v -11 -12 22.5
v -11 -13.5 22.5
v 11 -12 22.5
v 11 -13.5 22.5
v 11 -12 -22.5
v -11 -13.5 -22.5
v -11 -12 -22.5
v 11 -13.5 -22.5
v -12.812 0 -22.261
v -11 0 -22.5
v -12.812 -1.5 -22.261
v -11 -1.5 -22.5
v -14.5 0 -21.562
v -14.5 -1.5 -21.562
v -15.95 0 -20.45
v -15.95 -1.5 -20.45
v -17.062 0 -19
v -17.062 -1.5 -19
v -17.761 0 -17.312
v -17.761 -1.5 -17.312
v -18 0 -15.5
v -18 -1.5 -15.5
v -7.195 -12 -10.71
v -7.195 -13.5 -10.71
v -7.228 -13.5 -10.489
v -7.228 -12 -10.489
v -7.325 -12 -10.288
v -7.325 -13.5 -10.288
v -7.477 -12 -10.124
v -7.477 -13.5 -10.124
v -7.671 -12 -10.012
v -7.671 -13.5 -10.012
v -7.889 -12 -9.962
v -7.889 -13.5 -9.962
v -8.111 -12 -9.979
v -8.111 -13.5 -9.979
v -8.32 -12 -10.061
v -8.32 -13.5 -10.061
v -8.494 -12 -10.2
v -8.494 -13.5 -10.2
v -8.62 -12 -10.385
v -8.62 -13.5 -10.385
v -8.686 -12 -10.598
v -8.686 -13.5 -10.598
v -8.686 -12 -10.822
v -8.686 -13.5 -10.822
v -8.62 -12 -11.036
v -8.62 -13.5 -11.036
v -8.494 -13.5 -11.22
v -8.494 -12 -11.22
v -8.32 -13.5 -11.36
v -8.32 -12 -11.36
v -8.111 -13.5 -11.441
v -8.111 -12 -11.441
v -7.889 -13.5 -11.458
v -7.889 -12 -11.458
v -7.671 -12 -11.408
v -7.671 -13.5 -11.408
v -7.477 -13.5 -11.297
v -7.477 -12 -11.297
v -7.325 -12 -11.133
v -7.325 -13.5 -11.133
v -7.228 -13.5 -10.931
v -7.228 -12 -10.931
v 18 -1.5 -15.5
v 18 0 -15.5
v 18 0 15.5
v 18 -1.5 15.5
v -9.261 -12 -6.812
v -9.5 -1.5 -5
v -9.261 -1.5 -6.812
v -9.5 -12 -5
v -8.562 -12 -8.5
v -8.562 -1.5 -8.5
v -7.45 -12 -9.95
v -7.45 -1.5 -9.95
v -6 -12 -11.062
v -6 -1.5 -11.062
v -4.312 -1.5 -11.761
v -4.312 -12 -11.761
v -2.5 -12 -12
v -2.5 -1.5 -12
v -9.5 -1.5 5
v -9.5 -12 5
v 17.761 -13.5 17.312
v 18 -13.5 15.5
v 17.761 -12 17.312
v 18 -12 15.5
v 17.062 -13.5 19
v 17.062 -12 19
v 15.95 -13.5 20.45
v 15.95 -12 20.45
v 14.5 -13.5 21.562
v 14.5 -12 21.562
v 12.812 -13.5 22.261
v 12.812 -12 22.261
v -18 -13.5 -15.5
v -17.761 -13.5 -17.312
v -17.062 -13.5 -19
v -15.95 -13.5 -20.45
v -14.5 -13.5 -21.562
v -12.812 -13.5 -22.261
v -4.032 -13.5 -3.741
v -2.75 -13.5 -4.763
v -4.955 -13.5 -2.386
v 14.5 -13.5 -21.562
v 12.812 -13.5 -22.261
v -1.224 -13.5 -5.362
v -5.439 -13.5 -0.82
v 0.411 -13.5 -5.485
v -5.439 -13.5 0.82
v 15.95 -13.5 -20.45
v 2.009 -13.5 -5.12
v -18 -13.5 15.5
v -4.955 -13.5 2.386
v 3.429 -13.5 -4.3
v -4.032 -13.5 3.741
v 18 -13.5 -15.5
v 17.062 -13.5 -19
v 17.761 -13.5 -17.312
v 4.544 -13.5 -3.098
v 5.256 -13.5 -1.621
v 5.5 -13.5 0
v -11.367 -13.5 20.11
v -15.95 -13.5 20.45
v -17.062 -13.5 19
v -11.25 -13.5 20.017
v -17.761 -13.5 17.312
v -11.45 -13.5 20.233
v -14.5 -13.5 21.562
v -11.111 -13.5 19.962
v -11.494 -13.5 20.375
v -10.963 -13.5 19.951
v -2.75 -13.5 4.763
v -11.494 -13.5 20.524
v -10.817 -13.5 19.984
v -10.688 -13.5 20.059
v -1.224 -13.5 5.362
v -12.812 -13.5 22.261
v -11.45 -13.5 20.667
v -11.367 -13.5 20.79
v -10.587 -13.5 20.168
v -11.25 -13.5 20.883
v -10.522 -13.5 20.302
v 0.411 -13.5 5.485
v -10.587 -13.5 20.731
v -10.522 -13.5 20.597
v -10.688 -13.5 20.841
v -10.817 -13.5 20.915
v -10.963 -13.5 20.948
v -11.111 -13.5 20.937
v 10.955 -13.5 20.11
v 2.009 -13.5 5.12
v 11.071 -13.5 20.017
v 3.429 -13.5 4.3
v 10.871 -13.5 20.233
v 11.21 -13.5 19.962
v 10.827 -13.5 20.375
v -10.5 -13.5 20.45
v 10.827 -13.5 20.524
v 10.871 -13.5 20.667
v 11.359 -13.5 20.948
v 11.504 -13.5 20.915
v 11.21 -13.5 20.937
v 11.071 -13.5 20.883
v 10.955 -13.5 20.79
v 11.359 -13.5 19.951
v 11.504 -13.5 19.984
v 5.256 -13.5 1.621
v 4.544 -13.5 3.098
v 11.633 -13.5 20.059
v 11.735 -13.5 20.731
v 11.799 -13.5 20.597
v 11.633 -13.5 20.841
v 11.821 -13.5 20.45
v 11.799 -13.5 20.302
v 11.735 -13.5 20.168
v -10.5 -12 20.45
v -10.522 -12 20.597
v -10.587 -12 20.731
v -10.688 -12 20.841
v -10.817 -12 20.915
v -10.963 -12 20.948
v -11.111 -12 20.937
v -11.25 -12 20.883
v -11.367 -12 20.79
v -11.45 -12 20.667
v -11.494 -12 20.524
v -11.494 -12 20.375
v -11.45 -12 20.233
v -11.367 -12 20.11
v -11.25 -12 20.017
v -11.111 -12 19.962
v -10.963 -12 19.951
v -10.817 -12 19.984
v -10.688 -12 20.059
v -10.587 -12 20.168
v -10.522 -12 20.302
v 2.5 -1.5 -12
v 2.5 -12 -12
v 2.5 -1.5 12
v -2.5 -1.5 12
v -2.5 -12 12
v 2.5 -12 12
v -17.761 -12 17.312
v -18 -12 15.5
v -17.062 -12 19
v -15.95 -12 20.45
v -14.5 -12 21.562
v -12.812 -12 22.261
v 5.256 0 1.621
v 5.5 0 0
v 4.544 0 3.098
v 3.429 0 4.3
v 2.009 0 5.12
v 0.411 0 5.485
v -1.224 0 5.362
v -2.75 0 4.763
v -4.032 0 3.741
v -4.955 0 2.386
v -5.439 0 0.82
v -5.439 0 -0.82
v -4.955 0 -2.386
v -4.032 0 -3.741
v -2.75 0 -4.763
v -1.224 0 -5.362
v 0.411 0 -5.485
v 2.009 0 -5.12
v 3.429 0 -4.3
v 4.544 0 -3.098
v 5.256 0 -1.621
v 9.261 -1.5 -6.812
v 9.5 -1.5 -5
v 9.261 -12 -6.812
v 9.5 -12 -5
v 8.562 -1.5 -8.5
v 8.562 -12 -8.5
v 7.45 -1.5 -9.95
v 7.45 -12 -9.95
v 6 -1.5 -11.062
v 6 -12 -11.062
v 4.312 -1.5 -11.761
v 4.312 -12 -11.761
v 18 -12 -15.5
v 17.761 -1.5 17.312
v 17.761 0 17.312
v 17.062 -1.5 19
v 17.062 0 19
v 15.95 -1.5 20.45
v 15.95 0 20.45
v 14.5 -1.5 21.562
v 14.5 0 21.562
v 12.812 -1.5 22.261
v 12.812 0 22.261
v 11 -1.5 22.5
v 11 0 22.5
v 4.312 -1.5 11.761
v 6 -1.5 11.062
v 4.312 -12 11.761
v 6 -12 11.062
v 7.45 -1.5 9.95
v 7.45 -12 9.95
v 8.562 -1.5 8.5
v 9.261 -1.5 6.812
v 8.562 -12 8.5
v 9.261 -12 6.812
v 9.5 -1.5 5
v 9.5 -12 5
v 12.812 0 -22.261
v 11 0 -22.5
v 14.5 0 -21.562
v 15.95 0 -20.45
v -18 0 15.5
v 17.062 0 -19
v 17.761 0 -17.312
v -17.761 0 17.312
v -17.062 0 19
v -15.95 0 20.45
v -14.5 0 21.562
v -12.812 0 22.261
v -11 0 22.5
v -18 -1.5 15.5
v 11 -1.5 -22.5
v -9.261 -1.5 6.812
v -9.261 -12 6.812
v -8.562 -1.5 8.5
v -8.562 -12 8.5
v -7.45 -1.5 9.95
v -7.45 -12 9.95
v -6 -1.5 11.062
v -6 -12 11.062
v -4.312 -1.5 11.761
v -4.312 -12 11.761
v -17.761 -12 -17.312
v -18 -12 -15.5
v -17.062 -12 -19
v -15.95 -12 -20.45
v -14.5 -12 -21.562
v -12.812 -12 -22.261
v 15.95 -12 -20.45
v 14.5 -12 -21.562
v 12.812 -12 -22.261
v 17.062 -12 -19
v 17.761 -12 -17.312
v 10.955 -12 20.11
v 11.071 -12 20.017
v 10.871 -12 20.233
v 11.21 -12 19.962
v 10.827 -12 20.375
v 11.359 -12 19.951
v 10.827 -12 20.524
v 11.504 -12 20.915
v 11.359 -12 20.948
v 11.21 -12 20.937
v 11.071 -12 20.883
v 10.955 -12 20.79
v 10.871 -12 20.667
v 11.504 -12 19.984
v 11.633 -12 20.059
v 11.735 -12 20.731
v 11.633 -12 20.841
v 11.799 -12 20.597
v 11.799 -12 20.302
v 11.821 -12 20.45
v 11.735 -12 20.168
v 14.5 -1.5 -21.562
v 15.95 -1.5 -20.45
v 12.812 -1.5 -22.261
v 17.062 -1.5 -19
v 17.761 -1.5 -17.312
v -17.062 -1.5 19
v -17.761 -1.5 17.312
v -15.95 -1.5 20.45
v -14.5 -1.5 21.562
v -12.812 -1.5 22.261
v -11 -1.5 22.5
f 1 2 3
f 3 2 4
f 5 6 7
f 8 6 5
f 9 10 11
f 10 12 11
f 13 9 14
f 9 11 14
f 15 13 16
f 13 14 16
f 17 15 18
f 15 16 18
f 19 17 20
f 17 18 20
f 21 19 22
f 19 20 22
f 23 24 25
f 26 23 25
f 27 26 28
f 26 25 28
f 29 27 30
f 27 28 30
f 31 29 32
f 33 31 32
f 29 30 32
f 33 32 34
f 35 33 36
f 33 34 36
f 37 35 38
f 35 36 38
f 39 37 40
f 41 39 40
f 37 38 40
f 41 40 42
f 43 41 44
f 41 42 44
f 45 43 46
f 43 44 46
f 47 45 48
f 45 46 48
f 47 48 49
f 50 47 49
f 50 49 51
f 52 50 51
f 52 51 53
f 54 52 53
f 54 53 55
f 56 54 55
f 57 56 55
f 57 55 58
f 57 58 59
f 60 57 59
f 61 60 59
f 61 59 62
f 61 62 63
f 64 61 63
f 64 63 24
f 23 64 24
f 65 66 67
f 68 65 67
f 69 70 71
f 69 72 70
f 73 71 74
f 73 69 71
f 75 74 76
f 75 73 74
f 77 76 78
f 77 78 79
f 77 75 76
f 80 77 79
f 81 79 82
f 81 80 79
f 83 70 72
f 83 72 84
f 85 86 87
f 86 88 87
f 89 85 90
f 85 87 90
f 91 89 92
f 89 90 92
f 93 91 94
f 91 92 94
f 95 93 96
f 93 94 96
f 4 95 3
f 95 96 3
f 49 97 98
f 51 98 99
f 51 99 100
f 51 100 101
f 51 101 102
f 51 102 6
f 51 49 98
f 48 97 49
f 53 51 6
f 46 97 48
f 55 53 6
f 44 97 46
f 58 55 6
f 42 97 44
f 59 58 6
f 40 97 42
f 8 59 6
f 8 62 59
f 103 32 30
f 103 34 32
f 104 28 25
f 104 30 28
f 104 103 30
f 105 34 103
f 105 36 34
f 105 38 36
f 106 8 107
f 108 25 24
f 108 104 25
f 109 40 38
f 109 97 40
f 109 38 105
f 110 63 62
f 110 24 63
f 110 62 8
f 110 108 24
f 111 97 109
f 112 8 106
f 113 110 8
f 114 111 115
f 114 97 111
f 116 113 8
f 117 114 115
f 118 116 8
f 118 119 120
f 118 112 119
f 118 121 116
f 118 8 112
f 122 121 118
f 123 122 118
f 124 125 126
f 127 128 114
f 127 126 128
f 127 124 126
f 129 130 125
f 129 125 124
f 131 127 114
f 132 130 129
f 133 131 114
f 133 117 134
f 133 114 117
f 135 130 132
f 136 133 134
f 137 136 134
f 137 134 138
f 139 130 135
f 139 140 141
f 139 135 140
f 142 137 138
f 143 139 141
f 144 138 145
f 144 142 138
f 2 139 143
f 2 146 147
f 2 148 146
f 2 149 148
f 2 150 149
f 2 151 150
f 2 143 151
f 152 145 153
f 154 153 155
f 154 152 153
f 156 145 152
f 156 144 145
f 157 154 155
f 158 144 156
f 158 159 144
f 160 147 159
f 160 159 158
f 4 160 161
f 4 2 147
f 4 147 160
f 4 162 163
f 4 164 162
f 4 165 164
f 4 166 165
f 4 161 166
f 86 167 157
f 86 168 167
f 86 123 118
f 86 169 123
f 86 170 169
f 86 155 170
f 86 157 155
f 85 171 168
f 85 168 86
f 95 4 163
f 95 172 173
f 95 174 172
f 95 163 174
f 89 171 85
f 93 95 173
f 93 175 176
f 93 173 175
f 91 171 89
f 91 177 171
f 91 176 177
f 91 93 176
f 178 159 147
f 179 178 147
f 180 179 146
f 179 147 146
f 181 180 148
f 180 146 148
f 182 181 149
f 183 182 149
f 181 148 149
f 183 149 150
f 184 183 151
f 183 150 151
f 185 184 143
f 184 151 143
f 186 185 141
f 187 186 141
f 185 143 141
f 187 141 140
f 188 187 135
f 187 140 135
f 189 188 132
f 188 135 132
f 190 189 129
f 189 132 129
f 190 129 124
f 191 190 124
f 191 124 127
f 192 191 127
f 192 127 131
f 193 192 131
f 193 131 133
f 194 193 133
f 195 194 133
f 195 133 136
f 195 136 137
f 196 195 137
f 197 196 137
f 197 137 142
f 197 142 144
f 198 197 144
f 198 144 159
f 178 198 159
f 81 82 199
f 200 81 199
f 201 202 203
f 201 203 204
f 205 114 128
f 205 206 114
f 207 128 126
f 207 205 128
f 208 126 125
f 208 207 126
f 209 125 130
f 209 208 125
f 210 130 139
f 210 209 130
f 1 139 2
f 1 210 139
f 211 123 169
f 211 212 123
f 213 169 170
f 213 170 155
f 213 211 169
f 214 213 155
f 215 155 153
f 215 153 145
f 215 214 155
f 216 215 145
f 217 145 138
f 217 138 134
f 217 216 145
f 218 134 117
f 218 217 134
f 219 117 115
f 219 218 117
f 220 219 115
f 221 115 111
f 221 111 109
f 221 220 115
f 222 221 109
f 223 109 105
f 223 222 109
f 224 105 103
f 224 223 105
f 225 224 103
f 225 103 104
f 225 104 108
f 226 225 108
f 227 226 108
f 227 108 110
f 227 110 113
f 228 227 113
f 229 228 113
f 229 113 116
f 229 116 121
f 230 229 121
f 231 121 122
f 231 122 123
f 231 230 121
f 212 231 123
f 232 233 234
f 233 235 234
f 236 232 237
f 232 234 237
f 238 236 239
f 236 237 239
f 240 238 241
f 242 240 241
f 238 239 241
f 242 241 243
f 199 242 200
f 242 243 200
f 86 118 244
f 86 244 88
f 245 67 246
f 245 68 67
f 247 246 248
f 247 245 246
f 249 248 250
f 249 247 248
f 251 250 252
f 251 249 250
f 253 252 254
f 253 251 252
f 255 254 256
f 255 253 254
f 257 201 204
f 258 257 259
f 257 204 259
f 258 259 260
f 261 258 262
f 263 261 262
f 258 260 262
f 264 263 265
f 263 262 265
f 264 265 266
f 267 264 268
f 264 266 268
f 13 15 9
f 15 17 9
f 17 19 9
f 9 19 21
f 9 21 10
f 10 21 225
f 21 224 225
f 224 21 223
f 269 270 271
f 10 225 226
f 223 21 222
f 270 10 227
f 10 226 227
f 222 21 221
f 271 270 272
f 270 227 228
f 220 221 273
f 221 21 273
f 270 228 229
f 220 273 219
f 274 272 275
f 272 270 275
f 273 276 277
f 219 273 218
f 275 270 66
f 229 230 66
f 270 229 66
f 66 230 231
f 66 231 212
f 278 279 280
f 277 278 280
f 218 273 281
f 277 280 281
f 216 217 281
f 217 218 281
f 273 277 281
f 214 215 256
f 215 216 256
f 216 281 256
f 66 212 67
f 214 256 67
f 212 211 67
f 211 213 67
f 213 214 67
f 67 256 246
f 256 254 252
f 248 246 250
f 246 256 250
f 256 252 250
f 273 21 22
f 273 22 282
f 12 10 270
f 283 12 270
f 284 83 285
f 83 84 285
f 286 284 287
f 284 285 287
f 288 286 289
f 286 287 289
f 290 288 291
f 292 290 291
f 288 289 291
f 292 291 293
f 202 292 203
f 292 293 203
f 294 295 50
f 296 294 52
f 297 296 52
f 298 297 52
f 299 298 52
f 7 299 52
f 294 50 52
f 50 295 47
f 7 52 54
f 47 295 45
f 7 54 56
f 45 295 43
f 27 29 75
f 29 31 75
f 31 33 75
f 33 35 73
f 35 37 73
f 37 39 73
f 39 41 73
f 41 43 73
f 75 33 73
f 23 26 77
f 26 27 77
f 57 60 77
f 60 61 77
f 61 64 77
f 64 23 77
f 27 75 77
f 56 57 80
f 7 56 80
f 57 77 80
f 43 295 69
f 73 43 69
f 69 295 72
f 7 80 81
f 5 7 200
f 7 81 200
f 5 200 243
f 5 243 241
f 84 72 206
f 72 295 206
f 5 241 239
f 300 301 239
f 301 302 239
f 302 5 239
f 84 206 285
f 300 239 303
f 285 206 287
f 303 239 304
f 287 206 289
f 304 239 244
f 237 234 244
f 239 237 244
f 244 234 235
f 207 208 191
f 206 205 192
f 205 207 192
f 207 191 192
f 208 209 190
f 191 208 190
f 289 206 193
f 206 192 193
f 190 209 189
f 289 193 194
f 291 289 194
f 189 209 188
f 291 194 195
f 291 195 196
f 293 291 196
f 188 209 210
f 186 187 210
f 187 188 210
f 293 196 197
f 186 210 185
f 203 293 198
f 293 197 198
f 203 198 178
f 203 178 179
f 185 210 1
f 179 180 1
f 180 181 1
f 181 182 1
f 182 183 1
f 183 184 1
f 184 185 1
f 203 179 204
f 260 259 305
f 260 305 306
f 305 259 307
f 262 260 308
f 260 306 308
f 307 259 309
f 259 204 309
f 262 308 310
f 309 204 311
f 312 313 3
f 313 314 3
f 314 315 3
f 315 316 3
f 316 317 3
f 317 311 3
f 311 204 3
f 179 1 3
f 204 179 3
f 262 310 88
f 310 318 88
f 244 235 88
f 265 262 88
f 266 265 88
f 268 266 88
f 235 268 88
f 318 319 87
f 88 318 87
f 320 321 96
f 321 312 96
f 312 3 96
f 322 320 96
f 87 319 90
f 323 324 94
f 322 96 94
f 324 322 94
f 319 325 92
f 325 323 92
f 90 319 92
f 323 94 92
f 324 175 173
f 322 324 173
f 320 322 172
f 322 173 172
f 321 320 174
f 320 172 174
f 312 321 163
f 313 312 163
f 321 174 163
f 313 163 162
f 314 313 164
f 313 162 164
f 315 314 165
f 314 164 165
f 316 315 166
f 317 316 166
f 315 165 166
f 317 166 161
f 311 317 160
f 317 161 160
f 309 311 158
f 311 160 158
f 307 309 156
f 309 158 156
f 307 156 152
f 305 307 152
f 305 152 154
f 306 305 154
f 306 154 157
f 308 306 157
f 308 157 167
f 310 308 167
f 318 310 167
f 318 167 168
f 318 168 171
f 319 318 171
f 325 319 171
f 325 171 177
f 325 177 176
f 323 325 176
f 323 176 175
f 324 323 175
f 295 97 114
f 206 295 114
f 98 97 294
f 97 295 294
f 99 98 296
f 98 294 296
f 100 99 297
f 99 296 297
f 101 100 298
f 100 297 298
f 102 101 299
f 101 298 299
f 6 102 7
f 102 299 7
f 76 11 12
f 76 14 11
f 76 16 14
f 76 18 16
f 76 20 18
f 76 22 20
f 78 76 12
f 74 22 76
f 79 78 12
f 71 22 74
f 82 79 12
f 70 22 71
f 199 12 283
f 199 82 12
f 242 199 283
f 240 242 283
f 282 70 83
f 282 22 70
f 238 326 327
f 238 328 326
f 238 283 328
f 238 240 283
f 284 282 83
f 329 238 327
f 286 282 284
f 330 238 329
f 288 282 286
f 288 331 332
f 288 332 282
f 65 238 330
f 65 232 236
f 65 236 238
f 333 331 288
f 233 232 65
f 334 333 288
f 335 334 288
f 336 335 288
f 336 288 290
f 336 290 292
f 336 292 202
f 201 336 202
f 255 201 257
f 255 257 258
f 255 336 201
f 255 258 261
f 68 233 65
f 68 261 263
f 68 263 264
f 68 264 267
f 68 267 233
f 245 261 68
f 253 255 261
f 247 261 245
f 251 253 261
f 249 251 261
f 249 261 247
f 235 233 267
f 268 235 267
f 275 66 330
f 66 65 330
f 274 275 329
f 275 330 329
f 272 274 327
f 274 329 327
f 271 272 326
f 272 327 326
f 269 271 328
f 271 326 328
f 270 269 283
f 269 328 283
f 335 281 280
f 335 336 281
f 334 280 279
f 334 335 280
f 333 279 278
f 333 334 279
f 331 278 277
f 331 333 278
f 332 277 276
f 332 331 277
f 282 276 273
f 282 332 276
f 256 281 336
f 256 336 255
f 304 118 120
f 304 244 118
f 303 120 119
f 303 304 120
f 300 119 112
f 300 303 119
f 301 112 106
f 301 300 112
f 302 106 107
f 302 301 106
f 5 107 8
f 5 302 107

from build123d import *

# Parameters (mm, degrees)
F0_W      = 36
F0_H      = 45
F0_R      = 5.5
F1_DEPTH  = 1.5
F2_W      = 19
F2_H      = 24
F2_R      = 5.5
F3_DEPTH  = 12
F4_W      = 36
F4_H      = 45
F4_W_2    = 19
F4_H_2    = 24
F4_R      = 5.5
F5_DEPTH  = 1.5
F6_R      = 7
F7_R      = 0.75
F8_DEPTH  = 2.5
F9_R      = 0.5
F10_DEPTH = 2.5


# Not quite as in the source:
# - a feature names something its author has since deleted; it is built from what else it names


with BuildPart() as f1:
    # F0 (on Front) → F1 (new body)
    with BuildSketch(Plane.XZ):
        Rectangle(F0_W, F0_H)
        Circle(F0_R, mode=Mode.SUBTRACT)
    extrude(amount=F1_DEPTH)

    # F2 (on face) → F3 (join)
    with BuildSketch(Plane.XZ.offset(1.5)):
        Rectangle(F2_W, F2_H)
        Circle(F2_R, mode=Mode.SUBTRACT)
    extrude(amount=F3_DEPTH)

    # F4 (on face) → F5 (join)
    with BuildSketch(Plane.XZ.offset(13.5)):
        Rectangle(F4_W, F4_H)
        Rectangle(F4_W_2, F4_H_2, mode=Mode.SUBTRACT)
        Rectangle(F4_W_2, F4_H_2)
        Circle(F4_R, mode=Mode.SUBTRACT)
    extrude(amount=-F5_DEPTH)

    # F6
    f6_edges = [f1.edges().sort_by_distance(p)[0] for p in [
        (9.5, -6.75, 12),
        (9.5, -6.75, -12),
        (18, -0.75, 22.5),
        (18, -12.75, 22.5),
        (18, -12.75, -22.5),
        (18, -0.75, -22.5),
        (-18, -0.75, -22.5),
        (-18, -12.75, -22.5),
        (-9.5, -6.75, -12),
        (-9.5, -6.75, 12),
        (-18, -0.75, 22.5),
        (-18, -12.75, 22.5),
    ]]
    fillet(f6_edges, radius=F6_R)

    # F7 (on face) → F8 (cut)
    with BuildSketch(Plane.XZ.offset(13.5)):
        with Locations((-7.9445969313, -10.7102040201)):
            Circle(F7_R)
    extrude(amount=-F8_DEPTH, mode=Mode.SUBTRACT)

    # F9 (on face) → F10 (cut)
    with BuildSketch(Plane.XZ.offset(13.5)):
        with Locations((-11, 20.4497474683)):
            Circle(F9_R)
        with Locations((11.3213816658, 20.4497474683)):
            Circle(F9_R)
    extrude(amount=-F10_DEPTH, mode=Mode.SUBTRACT)


solid = f1.part
